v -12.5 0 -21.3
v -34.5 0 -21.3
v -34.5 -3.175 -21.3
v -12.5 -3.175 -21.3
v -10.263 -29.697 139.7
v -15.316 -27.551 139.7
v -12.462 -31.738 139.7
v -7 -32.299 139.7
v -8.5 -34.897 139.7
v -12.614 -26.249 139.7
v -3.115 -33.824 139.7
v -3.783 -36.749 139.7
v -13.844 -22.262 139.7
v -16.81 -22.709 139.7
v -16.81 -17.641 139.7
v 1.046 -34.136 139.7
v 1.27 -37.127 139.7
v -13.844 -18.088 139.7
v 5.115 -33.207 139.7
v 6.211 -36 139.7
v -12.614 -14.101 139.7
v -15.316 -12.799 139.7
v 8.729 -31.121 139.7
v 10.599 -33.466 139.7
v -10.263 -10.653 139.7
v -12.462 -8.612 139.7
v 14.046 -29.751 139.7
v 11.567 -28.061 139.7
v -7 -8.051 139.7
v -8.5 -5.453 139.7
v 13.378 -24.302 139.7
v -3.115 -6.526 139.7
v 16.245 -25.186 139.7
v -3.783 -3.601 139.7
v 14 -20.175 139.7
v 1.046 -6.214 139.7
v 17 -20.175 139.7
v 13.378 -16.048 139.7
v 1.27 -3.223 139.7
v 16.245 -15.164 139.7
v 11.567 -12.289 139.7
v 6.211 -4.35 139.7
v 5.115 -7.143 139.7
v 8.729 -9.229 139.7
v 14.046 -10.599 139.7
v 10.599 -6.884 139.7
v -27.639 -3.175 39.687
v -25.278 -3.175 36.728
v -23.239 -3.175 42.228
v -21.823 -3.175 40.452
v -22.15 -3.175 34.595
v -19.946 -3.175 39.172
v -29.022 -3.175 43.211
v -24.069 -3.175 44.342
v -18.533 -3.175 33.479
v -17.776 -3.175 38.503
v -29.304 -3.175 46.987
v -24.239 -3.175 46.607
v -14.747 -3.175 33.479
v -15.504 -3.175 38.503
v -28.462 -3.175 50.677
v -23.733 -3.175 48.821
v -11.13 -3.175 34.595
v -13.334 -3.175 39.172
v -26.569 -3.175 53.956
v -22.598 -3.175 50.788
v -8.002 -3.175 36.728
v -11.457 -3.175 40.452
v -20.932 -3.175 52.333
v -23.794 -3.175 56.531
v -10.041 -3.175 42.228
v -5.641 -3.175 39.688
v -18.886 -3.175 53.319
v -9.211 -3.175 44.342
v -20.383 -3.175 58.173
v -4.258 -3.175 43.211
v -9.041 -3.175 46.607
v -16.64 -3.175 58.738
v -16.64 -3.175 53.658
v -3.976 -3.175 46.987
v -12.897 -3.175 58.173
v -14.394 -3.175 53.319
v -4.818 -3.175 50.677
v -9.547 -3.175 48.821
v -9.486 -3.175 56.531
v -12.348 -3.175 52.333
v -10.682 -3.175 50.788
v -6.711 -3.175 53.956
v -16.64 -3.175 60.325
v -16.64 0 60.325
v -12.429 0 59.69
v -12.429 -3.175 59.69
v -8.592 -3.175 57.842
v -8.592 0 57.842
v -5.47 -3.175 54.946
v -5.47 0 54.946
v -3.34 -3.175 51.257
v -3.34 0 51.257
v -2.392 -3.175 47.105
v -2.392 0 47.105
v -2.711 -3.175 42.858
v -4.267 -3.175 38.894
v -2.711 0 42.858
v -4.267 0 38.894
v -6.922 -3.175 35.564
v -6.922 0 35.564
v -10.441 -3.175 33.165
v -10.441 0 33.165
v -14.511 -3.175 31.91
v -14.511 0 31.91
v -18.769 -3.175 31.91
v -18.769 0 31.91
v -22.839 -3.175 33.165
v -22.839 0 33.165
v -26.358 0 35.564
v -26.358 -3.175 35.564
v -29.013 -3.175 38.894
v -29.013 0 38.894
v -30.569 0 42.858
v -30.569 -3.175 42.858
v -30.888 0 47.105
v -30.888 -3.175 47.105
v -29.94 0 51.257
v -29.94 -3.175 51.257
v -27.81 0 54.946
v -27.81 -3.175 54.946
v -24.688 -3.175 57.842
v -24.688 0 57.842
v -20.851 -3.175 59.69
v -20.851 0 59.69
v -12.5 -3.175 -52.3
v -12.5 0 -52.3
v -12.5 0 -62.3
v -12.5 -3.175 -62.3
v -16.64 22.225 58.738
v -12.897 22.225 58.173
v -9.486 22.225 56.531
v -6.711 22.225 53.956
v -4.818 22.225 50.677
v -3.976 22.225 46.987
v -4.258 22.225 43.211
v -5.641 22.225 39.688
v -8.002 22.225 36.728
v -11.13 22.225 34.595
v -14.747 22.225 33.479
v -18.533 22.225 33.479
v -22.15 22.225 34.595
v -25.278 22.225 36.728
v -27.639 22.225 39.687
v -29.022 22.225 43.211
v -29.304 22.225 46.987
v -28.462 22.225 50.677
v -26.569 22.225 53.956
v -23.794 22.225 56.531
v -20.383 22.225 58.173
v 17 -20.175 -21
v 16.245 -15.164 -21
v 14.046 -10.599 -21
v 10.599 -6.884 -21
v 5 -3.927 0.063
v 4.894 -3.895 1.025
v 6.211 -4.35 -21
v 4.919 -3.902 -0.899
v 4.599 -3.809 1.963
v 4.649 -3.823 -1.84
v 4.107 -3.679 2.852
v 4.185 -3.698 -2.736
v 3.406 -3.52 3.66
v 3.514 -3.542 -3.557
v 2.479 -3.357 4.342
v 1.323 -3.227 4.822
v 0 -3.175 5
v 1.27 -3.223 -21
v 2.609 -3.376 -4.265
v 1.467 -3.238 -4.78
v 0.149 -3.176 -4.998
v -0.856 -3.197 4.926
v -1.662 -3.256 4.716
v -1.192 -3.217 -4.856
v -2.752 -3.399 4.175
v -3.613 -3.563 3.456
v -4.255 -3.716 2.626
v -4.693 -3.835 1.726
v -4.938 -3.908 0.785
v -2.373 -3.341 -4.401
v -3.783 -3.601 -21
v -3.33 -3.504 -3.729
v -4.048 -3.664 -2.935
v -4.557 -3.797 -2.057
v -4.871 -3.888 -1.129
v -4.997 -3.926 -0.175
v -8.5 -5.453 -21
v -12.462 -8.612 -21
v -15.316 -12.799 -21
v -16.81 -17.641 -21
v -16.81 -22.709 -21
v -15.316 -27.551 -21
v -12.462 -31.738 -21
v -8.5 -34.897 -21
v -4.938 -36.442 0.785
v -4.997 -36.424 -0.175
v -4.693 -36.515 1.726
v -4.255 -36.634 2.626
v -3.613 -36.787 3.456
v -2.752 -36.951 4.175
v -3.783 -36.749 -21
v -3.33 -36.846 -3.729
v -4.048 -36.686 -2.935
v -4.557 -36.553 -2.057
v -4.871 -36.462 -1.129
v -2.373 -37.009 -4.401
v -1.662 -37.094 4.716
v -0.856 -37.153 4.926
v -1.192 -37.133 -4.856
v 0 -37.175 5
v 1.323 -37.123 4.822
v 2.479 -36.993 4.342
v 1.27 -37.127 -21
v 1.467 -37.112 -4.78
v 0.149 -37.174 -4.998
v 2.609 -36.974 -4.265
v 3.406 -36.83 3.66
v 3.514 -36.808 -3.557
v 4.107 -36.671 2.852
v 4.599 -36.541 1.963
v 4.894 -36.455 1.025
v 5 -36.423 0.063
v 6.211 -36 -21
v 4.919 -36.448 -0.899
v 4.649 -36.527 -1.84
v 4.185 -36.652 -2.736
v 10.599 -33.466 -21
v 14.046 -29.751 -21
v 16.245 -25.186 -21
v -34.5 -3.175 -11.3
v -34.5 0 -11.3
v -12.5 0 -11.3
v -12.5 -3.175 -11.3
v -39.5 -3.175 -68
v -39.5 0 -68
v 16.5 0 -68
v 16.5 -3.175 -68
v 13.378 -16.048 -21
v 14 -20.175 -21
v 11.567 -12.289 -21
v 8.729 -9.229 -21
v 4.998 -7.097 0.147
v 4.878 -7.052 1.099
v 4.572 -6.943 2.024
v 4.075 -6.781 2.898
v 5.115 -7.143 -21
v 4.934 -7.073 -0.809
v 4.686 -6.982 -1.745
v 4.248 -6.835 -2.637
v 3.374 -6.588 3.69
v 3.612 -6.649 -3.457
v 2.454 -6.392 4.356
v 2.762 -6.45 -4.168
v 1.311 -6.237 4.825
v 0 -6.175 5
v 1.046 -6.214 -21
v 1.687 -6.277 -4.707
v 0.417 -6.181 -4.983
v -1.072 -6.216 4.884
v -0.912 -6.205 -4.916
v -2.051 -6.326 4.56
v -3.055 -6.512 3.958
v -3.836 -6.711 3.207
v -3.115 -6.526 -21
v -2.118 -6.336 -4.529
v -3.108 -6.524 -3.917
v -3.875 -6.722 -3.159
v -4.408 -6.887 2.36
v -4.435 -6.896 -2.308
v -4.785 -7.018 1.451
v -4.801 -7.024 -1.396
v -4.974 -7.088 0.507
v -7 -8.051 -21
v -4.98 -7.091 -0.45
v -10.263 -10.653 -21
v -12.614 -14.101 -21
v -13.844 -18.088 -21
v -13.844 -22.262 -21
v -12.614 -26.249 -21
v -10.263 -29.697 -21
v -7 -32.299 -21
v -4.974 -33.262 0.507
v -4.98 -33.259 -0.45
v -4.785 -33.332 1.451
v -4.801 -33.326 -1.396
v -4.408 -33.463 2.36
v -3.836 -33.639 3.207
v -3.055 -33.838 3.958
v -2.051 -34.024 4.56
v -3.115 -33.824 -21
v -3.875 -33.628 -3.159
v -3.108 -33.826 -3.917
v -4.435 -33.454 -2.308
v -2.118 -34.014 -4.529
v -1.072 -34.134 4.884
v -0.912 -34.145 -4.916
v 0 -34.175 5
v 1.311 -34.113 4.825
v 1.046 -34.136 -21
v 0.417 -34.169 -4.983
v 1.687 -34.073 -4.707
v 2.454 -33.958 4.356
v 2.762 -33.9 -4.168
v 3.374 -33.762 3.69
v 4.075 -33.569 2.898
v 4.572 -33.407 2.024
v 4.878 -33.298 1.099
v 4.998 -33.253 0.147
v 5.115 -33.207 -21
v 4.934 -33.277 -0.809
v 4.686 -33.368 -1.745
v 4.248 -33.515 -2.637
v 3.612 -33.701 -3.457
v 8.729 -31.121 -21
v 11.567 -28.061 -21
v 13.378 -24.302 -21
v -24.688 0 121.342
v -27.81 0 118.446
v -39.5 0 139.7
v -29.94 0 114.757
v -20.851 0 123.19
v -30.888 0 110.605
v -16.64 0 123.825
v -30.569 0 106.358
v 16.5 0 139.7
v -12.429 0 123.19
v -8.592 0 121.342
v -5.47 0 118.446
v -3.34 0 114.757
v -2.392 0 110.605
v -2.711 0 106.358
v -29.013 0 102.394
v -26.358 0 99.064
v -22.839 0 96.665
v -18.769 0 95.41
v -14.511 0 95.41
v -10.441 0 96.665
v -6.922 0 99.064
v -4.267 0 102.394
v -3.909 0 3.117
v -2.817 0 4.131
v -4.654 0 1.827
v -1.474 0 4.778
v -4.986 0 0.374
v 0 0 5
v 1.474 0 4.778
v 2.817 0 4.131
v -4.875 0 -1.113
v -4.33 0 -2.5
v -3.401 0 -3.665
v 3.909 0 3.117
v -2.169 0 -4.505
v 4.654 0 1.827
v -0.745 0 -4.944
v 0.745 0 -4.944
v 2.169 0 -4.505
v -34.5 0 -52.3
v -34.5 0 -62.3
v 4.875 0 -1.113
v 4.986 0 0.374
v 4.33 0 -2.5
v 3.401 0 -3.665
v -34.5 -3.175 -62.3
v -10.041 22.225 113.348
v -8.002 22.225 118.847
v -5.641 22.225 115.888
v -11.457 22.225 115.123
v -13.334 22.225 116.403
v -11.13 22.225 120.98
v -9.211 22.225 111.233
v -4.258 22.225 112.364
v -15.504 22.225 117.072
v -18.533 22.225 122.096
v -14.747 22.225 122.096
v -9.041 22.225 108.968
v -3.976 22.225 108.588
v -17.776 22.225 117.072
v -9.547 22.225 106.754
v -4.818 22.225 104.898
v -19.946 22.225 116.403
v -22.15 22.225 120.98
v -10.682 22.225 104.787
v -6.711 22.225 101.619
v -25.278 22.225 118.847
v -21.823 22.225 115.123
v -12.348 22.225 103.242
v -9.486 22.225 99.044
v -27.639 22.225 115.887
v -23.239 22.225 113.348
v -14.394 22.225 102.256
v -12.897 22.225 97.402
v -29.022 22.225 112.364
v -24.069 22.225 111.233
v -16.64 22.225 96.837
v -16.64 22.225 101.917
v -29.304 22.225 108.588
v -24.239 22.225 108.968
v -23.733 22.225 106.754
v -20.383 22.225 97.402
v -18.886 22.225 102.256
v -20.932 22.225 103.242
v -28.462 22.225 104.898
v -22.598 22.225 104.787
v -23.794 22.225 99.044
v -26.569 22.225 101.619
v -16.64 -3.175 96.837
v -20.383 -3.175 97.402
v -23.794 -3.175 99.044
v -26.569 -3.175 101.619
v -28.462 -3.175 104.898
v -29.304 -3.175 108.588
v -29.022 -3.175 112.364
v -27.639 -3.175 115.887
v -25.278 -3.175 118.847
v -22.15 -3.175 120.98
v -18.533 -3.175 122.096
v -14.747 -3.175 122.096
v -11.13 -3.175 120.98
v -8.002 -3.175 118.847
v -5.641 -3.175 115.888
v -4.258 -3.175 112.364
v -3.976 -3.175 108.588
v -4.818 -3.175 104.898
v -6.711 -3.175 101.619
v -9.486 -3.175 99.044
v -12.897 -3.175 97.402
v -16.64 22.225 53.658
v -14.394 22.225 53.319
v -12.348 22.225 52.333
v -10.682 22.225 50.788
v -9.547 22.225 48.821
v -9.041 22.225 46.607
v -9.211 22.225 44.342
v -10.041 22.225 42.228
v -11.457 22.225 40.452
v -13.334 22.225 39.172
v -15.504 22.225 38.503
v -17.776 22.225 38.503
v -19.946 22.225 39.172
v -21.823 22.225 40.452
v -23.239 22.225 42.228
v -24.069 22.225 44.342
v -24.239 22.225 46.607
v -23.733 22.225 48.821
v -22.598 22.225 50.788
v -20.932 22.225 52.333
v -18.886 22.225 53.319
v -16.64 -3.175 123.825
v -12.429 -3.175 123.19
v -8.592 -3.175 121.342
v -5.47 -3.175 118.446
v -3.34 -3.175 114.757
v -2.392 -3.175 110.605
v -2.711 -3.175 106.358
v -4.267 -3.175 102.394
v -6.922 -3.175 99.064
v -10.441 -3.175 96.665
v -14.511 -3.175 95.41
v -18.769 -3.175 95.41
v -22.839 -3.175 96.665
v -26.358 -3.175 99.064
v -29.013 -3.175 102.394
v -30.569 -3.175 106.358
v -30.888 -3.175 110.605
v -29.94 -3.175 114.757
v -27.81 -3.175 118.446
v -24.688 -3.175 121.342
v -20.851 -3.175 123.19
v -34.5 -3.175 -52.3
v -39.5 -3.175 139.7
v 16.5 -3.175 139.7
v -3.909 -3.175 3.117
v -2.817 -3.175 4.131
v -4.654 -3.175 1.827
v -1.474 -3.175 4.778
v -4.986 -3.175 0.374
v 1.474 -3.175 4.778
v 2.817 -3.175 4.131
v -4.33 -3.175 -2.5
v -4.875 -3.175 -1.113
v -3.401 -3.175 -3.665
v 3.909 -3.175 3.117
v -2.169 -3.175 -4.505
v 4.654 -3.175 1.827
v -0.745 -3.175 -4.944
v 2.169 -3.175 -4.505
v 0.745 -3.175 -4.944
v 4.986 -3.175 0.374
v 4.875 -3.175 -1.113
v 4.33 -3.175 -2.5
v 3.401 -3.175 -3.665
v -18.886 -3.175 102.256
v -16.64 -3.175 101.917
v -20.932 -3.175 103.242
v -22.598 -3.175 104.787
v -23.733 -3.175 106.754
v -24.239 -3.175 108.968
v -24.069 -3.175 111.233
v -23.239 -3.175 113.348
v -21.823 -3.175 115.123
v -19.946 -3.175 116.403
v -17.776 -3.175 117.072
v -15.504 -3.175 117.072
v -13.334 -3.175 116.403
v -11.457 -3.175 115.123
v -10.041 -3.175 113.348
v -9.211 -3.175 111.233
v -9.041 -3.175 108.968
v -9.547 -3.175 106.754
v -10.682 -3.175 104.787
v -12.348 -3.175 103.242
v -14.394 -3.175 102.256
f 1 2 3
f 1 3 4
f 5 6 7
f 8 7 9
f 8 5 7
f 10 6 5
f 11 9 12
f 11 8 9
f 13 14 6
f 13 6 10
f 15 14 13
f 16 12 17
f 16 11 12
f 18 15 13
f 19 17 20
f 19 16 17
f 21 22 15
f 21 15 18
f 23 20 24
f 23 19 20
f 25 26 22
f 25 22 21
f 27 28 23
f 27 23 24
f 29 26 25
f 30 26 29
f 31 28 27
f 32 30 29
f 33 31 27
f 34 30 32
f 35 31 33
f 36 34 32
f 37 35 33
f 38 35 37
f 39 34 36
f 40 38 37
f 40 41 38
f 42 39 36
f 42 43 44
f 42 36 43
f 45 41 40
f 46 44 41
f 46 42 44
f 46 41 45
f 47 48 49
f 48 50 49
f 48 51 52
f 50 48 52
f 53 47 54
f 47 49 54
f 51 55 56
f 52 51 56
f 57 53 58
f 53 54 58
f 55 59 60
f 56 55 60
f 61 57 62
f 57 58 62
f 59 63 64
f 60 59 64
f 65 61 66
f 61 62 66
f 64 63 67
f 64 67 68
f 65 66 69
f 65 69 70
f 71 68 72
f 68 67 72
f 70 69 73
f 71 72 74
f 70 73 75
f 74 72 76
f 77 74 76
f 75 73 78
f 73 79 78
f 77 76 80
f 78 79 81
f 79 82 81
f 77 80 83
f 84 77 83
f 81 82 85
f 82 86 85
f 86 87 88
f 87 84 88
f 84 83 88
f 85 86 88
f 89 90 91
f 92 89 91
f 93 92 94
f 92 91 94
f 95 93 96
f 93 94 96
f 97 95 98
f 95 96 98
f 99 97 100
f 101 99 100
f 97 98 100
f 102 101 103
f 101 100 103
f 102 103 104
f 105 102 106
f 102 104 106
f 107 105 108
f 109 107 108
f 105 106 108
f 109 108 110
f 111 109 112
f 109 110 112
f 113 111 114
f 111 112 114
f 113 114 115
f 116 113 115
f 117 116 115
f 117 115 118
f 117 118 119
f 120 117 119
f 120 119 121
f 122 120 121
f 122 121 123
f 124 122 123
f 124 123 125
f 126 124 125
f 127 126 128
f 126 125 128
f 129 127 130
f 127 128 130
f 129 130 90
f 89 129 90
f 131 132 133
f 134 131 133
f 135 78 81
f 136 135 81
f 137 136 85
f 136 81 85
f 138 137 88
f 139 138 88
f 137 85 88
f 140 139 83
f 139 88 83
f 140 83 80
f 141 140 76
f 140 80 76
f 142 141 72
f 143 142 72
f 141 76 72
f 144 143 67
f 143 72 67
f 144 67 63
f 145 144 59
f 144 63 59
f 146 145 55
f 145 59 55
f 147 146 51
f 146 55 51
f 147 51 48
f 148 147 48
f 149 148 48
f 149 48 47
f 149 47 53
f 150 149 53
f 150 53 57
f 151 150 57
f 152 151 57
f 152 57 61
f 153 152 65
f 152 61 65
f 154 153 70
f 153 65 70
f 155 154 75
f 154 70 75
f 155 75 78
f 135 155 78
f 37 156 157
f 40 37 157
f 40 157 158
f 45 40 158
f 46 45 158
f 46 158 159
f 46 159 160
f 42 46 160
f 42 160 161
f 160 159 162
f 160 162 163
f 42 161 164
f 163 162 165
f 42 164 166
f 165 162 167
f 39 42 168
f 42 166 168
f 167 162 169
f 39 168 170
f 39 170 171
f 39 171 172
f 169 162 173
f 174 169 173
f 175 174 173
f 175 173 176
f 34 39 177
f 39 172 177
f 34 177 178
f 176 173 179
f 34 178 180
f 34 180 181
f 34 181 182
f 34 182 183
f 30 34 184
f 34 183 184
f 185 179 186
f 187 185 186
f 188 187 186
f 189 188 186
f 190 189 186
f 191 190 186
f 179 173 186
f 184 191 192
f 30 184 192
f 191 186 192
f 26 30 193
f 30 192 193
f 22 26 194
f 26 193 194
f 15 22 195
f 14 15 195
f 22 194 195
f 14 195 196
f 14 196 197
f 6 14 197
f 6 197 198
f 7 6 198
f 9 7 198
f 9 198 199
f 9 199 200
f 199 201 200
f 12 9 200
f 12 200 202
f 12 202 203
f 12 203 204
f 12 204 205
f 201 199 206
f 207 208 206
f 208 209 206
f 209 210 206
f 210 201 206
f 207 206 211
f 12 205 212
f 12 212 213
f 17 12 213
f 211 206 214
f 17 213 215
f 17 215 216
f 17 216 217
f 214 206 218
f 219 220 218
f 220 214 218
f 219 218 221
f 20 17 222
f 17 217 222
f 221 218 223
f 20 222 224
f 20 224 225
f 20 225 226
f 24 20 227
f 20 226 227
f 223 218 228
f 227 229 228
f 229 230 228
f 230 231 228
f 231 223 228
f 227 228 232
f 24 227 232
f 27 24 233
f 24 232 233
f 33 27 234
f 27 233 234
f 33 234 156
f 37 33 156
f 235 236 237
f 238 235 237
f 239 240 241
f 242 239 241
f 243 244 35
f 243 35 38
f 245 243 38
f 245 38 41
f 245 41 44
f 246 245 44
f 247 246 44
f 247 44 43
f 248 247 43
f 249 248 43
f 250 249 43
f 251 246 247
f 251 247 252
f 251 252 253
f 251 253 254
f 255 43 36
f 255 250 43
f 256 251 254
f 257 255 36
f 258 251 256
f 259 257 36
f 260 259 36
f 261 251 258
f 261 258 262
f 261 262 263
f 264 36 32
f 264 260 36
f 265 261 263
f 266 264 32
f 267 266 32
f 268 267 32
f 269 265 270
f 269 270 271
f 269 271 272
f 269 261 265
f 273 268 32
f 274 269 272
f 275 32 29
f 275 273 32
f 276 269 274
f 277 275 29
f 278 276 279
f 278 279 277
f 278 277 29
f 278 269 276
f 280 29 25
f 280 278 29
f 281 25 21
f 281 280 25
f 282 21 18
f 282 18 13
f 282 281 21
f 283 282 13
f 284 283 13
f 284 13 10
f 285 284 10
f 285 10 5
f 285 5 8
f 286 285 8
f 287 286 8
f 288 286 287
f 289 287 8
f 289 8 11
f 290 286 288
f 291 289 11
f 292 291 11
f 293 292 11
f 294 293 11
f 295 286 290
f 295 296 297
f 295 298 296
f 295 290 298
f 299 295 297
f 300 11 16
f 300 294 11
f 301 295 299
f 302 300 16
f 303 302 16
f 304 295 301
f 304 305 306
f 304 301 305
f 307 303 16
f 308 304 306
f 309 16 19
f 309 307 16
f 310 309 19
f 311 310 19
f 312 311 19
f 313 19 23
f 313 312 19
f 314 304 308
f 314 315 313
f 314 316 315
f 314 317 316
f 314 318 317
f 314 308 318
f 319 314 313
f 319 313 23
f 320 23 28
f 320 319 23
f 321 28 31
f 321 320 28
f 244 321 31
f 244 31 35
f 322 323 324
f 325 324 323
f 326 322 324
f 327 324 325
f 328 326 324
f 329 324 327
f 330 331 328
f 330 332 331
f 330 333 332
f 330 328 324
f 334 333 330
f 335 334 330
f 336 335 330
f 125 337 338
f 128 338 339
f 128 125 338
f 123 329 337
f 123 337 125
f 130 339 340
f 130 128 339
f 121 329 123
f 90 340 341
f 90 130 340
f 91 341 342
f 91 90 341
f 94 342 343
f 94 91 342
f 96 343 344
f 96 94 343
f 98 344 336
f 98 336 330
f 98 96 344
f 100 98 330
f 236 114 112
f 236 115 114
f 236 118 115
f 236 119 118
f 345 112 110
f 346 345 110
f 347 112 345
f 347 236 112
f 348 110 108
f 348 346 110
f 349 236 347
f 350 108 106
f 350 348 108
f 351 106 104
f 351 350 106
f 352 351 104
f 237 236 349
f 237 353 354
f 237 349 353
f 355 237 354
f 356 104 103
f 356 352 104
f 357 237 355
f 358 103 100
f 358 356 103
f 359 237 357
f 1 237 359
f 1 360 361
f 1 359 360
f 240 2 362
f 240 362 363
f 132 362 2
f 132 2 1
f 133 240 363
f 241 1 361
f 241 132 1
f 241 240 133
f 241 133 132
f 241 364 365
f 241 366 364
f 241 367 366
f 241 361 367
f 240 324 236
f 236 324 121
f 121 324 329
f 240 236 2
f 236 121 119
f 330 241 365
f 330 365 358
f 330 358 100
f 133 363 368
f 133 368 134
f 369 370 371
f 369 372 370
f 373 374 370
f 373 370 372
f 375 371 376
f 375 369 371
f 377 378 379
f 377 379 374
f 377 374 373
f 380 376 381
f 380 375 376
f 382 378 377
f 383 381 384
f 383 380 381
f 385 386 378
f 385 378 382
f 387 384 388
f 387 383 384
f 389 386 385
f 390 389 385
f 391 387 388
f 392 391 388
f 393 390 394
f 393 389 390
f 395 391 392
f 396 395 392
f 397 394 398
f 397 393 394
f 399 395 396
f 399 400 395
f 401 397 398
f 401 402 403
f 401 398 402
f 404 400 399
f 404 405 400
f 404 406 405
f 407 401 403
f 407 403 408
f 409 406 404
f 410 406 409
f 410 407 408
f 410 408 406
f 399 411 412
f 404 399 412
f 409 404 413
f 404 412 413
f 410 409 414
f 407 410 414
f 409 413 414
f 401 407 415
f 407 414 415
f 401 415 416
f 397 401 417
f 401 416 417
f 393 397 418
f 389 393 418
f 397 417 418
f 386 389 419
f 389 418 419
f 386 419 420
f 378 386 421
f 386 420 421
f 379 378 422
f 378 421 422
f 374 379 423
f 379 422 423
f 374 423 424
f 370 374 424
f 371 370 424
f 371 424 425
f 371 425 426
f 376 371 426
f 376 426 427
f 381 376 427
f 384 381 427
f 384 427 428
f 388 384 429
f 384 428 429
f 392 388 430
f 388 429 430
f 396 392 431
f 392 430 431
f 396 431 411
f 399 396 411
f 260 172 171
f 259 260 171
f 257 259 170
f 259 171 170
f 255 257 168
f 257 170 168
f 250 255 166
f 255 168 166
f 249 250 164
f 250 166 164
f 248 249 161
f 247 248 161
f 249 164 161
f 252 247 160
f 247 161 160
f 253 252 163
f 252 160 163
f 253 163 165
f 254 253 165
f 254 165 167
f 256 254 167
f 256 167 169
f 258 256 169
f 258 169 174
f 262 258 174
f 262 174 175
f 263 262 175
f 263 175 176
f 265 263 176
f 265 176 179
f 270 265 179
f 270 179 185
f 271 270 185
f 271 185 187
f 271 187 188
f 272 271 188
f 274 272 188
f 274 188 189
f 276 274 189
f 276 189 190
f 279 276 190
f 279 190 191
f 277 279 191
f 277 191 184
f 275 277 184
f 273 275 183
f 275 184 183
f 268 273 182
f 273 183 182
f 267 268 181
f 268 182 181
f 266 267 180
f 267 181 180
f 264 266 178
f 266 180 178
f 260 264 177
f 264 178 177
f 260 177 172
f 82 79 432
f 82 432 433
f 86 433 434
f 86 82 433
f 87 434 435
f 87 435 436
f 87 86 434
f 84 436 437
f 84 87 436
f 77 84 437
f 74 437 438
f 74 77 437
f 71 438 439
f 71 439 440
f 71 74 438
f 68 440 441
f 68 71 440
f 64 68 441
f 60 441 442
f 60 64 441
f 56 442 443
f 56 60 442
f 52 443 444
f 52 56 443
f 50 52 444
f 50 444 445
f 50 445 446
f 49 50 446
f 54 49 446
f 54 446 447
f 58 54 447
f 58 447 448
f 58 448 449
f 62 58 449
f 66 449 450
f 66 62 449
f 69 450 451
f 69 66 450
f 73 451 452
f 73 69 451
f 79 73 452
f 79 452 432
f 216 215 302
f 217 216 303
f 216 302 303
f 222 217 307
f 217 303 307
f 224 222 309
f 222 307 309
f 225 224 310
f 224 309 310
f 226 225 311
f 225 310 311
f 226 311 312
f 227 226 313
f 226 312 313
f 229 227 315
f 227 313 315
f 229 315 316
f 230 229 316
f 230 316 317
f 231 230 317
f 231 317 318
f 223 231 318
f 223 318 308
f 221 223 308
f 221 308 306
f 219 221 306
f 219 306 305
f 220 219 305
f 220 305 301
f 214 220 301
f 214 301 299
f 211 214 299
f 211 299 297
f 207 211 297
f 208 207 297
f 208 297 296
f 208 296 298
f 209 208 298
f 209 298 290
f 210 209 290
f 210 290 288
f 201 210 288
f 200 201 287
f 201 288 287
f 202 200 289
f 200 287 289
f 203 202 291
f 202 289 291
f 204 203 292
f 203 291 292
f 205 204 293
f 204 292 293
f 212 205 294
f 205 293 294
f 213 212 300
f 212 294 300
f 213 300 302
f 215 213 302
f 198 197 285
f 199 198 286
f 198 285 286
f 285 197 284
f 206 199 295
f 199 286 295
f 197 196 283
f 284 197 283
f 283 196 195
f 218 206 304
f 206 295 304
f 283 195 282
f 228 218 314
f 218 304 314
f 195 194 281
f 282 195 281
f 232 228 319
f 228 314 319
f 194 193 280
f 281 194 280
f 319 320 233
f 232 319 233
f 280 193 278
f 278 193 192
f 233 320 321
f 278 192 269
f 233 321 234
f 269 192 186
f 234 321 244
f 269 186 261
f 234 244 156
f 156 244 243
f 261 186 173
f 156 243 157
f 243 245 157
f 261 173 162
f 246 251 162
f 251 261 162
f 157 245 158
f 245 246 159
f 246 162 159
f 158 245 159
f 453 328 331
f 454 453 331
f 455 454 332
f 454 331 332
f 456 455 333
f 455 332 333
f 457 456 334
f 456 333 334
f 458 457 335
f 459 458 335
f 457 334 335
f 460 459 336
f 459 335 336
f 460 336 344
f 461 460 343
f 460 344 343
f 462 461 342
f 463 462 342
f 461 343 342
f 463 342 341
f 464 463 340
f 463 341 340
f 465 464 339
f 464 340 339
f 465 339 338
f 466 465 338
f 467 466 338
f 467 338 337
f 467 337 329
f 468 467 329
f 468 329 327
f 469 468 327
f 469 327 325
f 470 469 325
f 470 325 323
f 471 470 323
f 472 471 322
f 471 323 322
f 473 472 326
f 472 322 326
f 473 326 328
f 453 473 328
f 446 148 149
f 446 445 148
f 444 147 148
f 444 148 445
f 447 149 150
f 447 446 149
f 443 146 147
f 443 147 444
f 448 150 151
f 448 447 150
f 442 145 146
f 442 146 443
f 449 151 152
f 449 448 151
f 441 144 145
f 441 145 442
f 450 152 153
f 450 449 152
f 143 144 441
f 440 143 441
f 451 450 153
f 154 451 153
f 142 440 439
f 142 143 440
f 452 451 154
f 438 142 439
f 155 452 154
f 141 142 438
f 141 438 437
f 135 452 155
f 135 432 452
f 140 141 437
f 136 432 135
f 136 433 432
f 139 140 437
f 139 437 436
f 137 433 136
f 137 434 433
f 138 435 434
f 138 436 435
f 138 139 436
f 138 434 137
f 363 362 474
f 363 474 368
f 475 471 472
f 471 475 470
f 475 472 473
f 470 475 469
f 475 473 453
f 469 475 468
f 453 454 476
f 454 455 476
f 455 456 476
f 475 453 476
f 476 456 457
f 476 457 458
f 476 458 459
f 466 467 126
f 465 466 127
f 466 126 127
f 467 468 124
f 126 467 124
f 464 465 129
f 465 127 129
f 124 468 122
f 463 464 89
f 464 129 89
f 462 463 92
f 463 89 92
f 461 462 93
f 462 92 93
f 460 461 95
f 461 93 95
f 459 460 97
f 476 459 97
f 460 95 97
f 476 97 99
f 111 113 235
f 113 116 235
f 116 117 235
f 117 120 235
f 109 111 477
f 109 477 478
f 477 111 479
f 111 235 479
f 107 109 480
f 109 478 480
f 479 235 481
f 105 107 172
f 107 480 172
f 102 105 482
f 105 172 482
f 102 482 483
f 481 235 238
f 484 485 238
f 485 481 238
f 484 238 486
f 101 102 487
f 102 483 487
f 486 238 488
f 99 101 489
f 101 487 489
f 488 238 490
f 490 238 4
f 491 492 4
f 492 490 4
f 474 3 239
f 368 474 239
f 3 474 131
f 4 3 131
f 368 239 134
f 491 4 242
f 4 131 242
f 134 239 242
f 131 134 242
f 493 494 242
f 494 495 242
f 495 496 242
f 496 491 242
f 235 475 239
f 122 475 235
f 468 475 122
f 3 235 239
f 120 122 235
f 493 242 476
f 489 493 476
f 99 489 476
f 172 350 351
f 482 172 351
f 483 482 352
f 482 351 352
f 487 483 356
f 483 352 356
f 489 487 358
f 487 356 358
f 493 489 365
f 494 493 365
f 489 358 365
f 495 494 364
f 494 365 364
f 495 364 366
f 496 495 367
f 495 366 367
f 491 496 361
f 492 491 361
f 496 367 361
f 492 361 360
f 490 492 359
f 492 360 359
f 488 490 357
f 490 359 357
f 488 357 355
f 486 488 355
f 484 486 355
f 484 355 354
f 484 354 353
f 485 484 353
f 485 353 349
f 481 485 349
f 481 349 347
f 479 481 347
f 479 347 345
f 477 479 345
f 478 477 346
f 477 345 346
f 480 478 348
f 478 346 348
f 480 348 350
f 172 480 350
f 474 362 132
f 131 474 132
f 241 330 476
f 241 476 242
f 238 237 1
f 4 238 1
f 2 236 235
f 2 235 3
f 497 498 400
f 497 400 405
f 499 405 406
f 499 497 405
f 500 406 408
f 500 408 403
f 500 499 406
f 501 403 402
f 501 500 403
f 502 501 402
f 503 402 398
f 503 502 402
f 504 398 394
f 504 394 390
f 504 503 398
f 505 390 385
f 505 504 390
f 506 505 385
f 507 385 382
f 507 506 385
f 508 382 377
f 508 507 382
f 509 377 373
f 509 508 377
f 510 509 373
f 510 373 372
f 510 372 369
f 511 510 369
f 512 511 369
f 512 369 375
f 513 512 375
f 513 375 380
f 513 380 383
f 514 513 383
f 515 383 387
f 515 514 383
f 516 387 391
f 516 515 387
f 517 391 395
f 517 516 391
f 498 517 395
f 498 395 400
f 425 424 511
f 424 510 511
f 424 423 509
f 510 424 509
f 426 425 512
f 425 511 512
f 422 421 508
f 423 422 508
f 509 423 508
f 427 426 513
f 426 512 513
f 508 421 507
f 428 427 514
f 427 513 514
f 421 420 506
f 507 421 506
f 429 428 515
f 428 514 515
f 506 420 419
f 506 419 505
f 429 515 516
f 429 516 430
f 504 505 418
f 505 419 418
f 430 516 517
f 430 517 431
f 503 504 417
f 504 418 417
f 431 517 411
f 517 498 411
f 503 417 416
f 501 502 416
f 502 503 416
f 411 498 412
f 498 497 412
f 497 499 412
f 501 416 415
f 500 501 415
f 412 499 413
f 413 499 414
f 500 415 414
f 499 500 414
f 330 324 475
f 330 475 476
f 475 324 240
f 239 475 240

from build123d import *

# Parameters (mm, degrees)
SKETCH1_W                  = 56
SKETCH1_H                  = 207.7
SKETCH1_R                  = 5
SKETCH1_W_2                = 22
SKETCH1_H_2                = 10
BASE_FLANGE1_DEPTH         = 3.175
BOSS_EXTRUDE2_DEPTH        = 139.7
BOSS_EXTRUDE2_DEPTH_BACK   = 21
SKETCH7_R                  = 17
SKETCH7_R_2                = 14
SKETCH8_R                  = 5
CUT_EXTRUDE1_DEPTH         = 150.861004351
SKETCH6_R                  = 14.2875
CUT_EXTRUDE2_DEPTH         = 3.175
BOSS_EXTRUDE3_DEPTH        = 22.225
BOSS_EXTRUDE3_DEPTH_BACK   = 3.175
SKETCH6_4_R                = 12.7
SKETCH6_4_R_2              = 7.62
BOSS_EXTRUDE3_2_DEPTH      = 22.225
BOSS_EXTRUDE3_2_DEPTH_BACK = 3.175


# Sheet-metal steps are written as plain solids
with BuildPart() as part:
    # Sketch1 → Base-Flange1 (new body)
    with BuildSketch(Plane(origin=(0, 0, 0), x_dir=(1, 0, 0), z_dir=(0, 1, 0))):
        with Locations((-11.5, -35.85)):
            Rectangle(SKETCH1_W, SKETCH1_H)
        with Locations(Location((0, 0, 0), (0, 0, 270))):
            Circle(SKETCH1_R, mode=Mode.SUBTRACT)
        with Locations((-23.5, 57.3)):
            Rectangle(SKETCH1_W_2, SKETCH1_H_2, mode=Mode.SUBTRACT)
        with Locations((-23.5, 16.3)):
            Rectangle(SKETCH1_W_2, SKETCH1_H_2, mode=Mode.SUBTRACT)
    extrude(amount=-BASE_FLANGE1_DEPTH)

    # Sketch6 → Cut-Extrude2 (cut)
    with BuildSketch(Plane(origin=(0, 0, 0), x_dir=(1, 0, 0), z_dir=(0, 1, 0))):
        with Locations(Location((-16.64, -46.0375, 0), (0, 0, 270))):
            Circle(SKETCH6_R)
        with Locations(Location((-16.64, -109.5375, 0), (0, 0, 270))):
            Circle(SKETCH6_R)
    extrude(amount=-CUT_EXTRUDE2_DEPTH, mode=Mode.SUBTRACT)


with BuildPart() as body_2:
    # Sketch7 → Boss-Extrude2 (new, two sides: drawn at the far end of the back side and taken through both)
    with BuildSketch(Plane.XY.offset(-BOSS_EXTRUDE2_DEPTH_BACK)):
        with Locations((0, -20.175)):
            Circle(SKETCH7_R)
        with Locations((0, -20.175)):
            Circle(SKETCH7_R_2, mode=Mode.SUBTRACT)
    extrude(amount=BOSS_EXTRUDE2_DEPTH + BOSS_EXTRUDE2_DEPTH_BACK)

    # Sketch8 → Cut-Extrude1 (cut, through all)
    with BuildSketch(Plane(origin=(0, 0, 0), x_dir=(1, 0, 0), z_dir=(0, 1, 0))):
        with Locations(Location((0, 0, 0), (0, 0, 270))):
            Circle(SKETCH8_R)
    extrude(amount=-CUT_EXTRUDE1_DEPTH, mode=Mode.SUBTRACT)


with BuildPart() as body_3:
    # Sketch6<4> → Boss-Extrude3 (new, two sides: drawn at the far end of the back side and taken through both)
    with BuildSketch(Plane(origin=(0, 0, 0), x_dir=(1, 0, 0), z_dir=(0, 1, 0)).offset(-BOSS_EXTRUDE3_DEPTH_BACK)):
        with Locations(Location((-16.64, -46.0375, 0), (0, 0, 270))):
            Circle(SKETCH6_4_R)
        with Locations(Location((-16.64, -46.0375, 0), (0, 0, 270))):
            Circle(SKETCH6_4_R_2, mode=Mode.SUBTRACT)
    extrude(amount=BOSS_EXTRUDE3_DEPTH + BOSS_EXTRUDE3_DEPTH_BACK)


with BuildPart() as body_4:
    # Sketch6<4> → Boss-Extrude3 2 (new, two sides: drawn at the far end of the back side and taken through both)
    with BuildSketch(Plane(origin=(0, 0, 0), x_dir=(1, 0, 0), z_dir=(0, 1, 0)).offset(-BOSS_EXTRUDE3_2_DEPTH_BACK)):
        with Locations(Location((-16.64, -109.5375, 0), (0, 0, 90))):
            Circle(SKETCH6_4_R)
        with Locations(Location((-16.64, -109.5375, 0), (0, 0, 90))):
            Circle(SKETCH6_4_R_2, mode=Mode.SUBTRACT)
    extrude(amount=BOSS_EXTRUDE3_2_DEPTH + BOSS_EXTRUDE3_2_DEPTH_BACK)


solid = Compound([part.part, body_2.part, body_3.part, body_4.part])
